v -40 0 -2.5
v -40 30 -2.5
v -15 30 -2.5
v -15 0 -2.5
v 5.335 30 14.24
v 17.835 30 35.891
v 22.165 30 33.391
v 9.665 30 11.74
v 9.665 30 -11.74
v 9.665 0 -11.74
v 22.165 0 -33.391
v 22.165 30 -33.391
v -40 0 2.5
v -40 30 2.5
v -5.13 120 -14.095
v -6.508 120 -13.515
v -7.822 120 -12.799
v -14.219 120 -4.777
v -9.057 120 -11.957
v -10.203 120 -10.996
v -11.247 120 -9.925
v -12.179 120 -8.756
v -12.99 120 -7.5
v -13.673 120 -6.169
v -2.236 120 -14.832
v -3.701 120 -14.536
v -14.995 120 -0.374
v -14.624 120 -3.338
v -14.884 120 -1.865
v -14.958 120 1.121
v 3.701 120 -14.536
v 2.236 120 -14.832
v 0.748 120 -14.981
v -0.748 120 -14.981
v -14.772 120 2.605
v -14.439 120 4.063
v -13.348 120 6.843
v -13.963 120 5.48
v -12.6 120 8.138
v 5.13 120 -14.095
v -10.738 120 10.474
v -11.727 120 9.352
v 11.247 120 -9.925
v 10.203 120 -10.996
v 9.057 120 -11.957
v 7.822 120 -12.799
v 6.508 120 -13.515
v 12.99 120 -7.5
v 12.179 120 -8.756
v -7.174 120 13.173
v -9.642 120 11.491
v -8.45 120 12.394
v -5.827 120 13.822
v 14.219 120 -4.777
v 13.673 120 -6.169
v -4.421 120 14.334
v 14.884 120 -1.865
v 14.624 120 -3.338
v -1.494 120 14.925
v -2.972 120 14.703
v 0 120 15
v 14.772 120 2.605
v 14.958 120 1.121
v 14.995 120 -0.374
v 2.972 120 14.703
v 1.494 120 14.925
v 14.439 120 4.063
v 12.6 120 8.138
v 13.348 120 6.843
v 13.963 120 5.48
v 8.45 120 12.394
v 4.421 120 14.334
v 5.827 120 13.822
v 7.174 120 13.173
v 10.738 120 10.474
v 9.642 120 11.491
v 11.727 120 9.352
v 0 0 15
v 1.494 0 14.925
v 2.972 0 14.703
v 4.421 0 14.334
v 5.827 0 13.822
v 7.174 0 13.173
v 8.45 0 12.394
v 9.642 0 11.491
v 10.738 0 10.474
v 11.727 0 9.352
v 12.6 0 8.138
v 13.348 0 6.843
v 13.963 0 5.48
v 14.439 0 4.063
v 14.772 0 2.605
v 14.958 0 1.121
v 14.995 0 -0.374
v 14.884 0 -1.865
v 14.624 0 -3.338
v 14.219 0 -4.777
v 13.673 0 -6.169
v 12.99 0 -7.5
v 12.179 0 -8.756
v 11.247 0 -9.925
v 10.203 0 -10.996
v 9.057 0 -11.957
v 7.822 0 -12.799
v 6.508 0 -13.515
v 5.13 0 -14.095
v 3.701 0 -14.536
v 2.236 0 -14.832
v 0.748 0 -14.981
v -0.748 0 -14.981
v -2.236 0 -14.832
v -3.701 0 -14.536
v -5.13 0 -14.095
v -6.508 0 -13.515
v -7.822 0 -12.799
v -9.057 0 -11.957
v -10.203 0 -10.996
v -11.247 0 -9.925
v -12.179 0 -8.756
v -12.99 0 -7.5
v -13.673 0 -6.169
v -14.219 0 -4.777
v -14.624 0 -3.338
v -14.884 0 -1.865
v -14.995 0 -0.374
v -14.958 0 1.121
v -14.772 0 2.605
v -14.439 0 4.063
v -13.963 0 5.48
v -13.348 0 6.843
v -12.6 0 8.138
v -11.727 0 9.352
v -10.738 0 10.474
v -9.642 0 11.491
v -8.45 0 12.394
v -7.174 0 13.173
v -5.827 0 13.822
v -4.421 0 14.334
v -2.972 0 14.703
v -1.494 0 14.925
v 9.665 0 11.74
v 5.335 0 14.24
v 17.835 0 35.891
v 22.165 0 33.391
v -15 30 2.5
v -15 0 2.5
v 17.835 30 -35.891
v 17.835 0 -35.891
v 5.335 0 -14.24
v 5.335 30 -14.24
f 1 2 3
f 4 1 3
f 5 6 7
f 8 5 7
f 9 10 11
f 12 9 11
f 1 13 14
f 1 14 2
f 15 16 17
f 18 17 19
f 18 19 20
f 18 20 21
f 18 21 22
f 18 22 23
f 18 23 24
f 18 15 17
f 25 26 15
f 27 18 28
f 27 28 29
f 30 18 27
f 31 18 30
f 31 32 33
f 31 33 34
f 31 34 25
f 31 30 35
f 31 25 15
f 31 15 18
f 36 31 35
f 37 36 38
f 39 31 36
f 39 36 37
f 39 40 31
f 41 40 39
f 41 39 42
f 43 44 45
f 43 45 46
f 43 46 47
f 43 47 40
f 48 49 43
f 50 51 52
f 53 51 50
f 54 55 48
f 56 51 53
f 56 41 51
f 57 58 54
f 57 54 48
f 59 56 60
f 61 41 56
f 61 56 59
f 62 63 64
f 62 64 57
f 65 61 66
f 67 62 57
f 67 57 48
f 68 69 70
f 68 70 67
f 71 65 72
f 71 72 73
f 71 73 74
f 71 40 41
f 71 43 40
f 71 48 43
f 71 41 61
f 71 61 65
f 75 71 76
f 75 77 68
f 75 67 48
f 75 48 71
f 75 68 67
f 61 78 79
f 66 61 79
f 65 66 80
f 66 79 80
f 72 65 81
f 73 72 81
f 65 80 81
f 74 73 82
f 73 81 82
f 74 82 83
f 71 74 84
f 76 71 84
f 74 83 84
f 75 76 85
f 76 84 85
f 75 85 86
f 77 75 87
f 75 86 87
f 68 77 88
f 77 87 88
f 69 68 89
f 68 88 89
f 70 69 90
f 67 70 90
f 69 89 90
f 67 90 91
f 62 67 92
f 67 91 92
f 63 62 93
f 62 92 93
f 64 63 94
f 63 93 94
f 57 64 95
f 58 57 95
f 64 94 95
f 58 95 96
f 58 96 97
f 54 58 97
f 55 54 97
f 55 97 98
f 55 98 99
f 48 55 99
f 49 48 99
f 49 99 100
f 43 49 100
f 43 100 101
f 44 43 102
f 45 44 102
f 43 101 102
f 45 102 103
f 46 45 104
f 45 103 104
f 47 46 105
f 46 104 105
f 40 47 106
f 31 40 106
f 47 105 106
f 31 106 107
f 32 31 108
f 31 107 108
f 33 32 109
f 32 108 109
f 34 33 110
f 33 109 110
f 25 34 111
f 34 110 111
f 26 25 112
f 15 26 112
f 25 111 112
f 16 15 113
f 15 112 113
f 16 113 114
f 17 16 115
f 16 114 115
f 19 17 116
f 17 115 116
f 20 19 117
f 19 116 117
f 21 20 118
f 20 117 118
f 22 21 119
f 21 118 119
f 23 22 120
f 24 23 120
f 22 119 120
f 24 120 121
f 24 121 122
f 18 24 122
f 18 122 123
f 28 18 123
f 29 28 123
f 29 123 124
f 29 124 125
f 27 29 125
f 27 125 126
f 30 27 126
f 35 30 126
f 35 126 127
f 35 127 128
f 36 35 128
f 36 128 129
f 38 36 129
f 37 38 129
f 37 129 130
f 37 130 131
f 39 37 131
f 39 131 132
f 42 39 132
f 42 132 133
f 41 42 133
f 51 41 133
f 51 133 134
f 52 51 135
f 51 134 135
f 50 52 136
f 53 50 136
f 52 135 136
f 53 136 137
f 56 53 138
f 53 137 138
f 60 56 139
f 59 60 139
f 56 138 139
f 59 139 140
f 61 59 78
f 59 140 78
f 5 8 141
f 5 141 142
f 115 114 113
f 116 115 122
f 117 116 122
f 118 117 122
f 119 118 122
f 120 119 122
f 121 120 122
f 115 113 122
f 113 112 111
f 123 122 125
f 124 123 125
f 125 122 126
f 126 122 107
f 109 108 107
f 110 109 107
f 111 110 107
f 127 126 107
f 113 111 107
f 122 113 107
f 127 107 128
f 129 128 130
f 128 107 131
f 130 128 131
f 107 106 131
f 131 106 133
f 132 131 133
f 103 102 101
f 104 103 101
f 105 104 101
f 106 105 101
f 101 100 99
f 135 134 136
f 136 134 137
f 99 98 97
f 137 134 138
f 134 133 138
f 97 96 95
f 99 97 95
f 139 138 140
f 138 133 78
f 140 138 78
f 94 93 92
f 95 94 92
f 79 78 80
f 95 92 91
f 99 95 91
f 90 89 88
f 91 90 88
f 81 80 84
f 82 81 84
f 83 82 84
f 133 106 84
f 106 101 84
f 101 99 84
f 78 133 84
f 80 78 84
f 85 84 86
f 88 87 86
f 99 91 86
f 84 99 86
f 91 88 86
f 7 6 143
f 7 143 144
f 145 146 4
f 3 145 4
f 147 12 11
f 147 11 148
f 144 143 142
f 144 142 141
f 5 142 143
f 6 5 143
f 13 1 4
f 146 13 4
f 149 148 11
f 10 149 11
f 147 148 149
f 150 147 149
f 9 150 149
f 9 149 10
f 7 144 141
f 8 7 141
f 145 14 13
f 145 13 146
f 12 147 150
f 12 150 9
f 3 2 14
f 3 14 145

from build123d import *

# Parameters (mm, degrees)
CROQUIS3_R              = 15
SALIENTE_EXTRUIR1_DEPTH = 120
SALIENTE_EXTRUIR2_DEPTH = 30
CROQUIS3_4_W            = 25
CROQUIS3_4_H            = 5
SALIENTE_EXTRUIR3_DEPTH = 30
SALIENTE_EXTRUIR4_DEPTH = 30


with BuildPart() as part:
    # Croquis3 → Saliente-Extruir1 (new body)
    with BuildSketch(Plane(origin=(0, 0, 0), x_dir=(1, 0, 0), z_dir=(0, 1, 0))):
        Circle(CROQUIS3_R)
    extrude(amount=SALIENTE_EXTRUIR1_DEPTH)


with BuildPart() as body_2:
    # Croquis3<3> → Saliente-Extruir2 (new body)
    with BuildSketch(Plane(origin=(0, 0, 0), x_dir=(1, 0, 0), z_dir=(0, 1, 0))):
        Polygon((5.334936491, -14.240381057), (17.834936491, -35.891016151), (22.165063509, -33.391016151), (9.665063509, -11.740381057), align=None)
    extrude(amount=SALIENTE_EXTRUIR2_DEPTH)


with BuildPart() as body_3:
    # Croquis3<4> → Saliente-Extruir3 (new body)
    with BuildSketch(Plane(origin=(0, 0, 0), x_dir=(1, 0, 0), z_dir=(0, 1, 0))):
        with Locations((-27.5, 0)):
            Rectangle(CROQUIS3_4_W, CROQUIS3_4_H)
    extrude(amount=SALIENTE_EXTRUIR3_DEPTH)


with BuildPart() as body_4:
    # Croquis3<5> → Saliente-Extruir4 (new body)
    with BuildSketch(Plane(origin=(0, 0, 0), x_dir=(1, 0, 0), z_dir=(0, 1, 0))):
        Polygon((9.665063509, 11.740381057), (22.165063509, 33.391016151), (17.834936491, 35.891016151), (5.334936491, 14.240381057), align=None)
    extrude(amount=SALIENTE_EXTRUIR4_DEPTH)


solid = Compound([part.part, body_2.part, body_3.part, body_4.part])
